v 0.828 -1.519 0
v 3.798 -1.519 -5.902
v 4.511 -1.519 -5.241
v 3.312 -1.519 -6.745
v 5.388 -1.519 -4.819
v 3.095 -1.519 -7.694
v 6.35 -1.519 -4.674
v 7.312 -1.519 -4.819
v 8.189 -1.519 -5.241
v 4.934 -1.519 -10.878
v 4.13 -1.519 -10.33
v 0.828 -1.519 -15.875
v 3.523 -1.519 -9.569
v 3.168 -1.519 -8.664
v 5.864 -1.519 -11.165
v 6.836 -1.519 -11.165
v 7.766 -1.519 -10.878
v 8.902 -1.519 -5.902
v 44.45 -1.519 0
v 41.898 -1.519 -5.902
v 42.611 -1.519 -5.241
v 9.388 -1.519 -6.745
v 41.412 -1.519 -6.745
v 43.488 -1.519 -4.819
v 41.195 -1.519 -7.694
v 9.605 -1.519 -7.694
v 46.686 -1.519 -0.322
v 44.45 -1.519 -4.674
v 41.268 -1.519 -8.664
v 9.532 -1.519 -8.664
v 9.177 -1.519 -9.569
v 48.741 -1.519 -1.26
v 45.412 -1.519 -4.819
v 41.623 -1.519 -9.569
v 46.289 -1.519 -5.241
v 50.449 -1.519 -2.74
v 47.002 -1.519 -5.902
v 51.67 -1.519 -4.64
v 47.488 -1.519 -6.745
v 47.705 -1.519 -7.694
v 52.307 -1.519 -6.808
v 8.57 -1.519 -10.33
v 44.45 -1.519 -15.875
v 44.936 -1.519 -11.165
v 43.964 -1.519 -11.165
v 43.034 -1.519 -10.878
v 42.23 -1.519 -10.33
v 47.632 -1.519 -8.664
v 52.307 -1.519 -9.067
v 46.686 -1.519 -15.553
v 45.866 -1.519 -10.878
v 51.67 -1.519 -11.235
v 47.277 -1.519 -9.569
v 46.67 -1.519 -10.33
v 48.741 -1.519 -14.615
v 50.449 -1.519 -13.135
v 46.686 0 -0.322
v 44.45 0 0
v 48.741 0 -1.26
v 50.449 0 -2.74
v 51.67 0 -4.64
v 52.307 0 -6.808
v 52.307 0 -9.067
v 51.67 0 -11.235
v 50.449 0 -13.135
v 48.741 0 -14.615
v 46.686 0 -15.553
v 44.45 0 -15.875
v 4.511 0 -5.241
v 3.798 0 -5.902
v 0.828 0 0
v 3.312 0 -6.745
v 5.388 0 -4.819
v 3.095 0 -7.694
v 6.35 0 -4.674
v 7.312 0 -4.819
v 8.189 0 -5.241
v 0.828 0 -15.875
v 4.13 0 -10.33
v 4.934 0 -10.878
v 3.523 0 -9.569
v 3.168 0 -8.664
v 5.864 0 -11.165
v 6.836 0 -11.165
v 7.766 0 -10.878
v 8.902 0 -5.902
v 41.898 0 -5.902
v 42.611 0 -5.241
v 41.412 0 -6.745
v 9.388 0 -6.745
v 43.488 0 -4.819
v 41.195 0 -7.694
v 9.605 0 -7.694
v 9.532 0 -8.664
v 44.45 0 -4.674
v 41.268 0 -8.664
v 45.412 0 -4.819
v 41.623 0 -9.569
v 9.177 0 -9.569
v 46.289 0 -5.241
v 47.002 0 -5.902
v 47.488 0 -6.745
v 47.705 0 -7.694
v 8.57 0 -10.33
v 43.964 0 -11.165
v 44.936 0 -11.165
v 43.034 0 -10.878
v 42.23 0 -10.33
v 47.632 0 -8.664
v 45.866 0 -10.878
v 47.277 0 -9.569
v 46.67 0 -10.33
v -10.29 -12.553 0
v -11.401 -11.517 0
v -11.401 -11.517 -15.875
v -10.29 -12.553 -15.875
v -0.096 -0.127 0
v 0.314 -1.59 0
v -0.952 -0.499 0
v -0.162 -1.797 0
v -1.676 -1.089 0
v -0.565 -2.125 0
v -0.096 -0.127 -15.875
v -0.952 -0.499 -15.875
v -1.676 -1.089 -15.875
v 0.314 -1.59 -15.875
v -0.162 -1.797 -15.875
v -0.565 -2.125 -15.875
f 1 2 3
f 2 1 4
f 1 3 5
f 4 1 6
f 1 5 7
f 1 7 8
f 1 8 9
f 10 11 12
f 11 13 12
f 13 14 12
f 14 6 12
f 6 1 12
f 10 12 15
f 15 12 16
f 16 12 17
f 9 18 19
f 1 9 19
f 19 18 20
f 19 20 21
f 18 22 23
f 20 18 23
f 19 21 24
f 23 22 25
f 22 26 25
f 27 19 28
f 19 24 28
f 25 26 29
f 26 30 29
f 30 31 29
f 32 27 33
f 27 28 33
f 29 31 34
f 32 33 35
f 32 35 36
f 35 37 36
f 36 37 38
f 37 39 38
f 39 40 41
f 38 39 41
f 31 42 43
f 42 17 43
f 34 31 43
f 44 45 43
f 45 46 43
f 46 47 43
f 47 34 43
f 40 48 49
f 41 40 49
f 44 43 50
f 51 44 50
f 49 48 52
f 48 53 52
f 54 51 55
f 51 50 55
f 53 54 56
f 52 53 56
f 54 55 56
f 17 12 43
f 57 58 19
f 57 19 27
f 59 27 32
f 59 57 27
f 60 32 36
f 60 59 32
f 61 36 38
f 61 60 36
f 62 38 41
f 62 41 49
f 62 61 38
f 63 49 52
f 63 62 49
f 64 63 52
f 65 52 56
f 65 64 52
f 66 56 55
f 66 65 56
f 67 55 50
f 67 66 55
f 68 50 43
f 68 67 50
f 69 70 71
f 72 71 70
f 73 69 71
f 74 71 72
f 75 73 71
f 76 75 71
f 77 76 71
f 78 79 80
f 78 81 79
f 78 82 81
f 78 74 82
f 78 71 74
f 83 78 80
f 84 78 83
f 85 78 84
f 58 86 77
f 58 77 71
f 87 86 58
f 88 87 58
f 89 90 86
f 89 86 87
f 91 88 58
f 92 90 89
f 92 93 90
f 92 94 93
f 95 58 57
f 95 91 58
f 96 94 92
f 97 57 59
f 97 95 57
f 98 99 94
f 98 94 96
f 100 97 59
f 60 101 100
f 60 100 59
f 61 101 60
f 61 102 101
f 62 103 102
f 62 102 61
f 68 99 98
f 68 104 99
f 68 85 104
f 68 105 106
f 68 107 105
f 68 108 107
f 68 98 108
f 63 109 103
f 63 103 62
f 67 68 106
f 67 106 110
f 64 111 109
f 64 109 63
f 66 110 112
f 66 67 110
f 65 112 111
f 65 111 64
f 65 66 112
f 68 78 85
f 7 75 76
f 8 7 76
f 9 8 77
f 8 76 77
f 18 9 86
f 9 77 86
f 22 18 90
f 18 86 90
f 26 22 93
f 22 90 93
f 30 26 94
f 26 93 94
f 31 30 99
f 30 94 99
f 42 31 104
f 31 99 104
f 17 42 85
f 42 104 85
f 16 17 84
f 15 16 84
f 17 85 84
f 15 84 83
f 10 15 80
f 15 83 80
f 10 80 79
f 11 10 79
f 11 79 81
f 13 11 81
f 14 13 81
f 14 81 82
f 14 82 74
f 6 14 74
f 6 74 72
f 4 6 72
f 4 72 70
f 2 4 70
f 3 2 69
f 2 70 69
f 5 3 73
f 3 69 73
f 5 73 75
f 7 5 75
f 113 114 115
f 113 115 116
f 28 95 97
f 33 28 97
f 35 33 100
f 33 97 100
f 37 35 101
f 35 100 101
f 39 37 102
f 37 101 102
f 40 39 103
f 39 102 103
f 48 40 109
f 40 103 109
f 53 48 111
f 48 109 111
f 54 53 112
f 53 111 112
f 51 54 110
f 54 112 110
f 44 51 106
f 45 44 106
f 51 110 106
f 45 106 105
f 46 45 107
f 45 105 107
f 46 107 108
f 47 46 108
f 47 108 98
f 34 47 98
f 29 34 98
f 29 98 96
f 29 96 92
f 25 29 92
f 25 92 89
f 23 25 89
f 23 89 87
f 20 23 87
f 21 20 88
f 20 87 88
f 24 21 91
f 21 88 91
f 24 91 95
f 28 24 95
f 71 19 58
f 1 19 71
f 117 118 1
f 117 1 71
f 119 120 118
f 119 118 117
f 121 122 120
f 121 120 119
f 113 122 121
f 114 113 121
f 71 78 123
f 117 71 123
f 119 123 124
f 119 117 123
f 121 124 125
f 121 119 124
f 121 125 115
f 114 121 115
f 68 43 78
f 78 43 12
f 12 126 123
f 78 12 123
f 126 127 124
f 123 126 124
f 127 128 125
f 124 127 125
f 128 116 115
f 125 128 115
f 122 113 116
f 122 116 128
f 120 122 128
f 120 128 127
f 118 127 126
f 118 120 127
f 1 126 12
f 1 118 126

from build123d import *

# Parameters (mm, degrees)
SKETCH1_R                    = 3.2639
BASE_FLANGE1_DEPTH           = 1.51892
EDGE_FLANGE1_STRIP_CUT_DEPTH = 15.875
EDGE_FLANGE1_DEPTH           = 15.875


# Sheet-metal steps are written as plain solids
with BuildPart() as part:
    # Sketch1 → Base-Flange1 (new body)
    with BuildSketch(Plane(origin=(0, 0, 0), x_dir=(1, 0, 0), z_dir=(0, 1, 0))):
        with BuildLine():
            Line((0, 0), (44.45, 0))
            ThreePointArc((44.45, 0), (52.3875, 7.9375), (44.45, 15.875))
            Line((44.45, 15.875), (0, 15.875))
            Line((0, 15.875), (0, 0))
        make_face()
        with Locations(Location((44.45, 7.9375, 0), (0, 0, 270))):
            Circle(SKETCH1_R, mode=Mode.SUBTRACT)
        with Locations(Location((6.35, 7.9375, 0), (0, 0, 270))):
            Circle(SKETCH1_R, mode=Mode.SUBTRACT)
    extrude(amount=-BASE_FLANGE1_DEPTH)

    # Edge-Flange1 strip (across the edge) → Edge-Flange1 strip cut (cut)
    with BuildSketch(Plane(origin=(0, -1.51892, 0), x_dir=(0.7313537016191672, -0.6819983600625019, 0), z_dir=(0, 0, -1))):
        Polygon((-7.660036486, 5.066238556), (-0.430107825, -1.675778992), (0.605793124, -0.564911227), (-6.624135537, 6.177106321), align=None)
    extrude(amount=EDGE_FLANGE1_STRIP_CUT_DEPTH, mode=Mode.SUBTRACT)

    # Edge-Flange1 section (across the edge) → Edge-Flange1 (add)
    with BuildSketch(Plane(origin=(0, -1.51892, 0), x_dir=(0.7313537016191672, -0.6819983600625019, 0), z_dir=(0, 0, -1))):
        with BuildLine():
            Line((-1.51892, 0.828317574), (-1.51892, 15.087554787))
            Line((-1.51892, 15.087554787), (0, 15.087554787))
            Line((0, 15.087554787), (0, 0.828317574))
            ThreePointArc((0, 0.828317574), (0.158000558, 0.068700598), (0.605793124, -0.564911227))
            Line((0.605793124, -0.564911227), (-0.430107825, -1.675778992))
            ThreePointArc((-0.430107825, -1.675778992), (-1.23494033, -0.536967338), (-1.51892, 0.828317574))
        make_face()
    extrude(amount=EDGE_FLANGE1_DEPTH)


solid = part.part
